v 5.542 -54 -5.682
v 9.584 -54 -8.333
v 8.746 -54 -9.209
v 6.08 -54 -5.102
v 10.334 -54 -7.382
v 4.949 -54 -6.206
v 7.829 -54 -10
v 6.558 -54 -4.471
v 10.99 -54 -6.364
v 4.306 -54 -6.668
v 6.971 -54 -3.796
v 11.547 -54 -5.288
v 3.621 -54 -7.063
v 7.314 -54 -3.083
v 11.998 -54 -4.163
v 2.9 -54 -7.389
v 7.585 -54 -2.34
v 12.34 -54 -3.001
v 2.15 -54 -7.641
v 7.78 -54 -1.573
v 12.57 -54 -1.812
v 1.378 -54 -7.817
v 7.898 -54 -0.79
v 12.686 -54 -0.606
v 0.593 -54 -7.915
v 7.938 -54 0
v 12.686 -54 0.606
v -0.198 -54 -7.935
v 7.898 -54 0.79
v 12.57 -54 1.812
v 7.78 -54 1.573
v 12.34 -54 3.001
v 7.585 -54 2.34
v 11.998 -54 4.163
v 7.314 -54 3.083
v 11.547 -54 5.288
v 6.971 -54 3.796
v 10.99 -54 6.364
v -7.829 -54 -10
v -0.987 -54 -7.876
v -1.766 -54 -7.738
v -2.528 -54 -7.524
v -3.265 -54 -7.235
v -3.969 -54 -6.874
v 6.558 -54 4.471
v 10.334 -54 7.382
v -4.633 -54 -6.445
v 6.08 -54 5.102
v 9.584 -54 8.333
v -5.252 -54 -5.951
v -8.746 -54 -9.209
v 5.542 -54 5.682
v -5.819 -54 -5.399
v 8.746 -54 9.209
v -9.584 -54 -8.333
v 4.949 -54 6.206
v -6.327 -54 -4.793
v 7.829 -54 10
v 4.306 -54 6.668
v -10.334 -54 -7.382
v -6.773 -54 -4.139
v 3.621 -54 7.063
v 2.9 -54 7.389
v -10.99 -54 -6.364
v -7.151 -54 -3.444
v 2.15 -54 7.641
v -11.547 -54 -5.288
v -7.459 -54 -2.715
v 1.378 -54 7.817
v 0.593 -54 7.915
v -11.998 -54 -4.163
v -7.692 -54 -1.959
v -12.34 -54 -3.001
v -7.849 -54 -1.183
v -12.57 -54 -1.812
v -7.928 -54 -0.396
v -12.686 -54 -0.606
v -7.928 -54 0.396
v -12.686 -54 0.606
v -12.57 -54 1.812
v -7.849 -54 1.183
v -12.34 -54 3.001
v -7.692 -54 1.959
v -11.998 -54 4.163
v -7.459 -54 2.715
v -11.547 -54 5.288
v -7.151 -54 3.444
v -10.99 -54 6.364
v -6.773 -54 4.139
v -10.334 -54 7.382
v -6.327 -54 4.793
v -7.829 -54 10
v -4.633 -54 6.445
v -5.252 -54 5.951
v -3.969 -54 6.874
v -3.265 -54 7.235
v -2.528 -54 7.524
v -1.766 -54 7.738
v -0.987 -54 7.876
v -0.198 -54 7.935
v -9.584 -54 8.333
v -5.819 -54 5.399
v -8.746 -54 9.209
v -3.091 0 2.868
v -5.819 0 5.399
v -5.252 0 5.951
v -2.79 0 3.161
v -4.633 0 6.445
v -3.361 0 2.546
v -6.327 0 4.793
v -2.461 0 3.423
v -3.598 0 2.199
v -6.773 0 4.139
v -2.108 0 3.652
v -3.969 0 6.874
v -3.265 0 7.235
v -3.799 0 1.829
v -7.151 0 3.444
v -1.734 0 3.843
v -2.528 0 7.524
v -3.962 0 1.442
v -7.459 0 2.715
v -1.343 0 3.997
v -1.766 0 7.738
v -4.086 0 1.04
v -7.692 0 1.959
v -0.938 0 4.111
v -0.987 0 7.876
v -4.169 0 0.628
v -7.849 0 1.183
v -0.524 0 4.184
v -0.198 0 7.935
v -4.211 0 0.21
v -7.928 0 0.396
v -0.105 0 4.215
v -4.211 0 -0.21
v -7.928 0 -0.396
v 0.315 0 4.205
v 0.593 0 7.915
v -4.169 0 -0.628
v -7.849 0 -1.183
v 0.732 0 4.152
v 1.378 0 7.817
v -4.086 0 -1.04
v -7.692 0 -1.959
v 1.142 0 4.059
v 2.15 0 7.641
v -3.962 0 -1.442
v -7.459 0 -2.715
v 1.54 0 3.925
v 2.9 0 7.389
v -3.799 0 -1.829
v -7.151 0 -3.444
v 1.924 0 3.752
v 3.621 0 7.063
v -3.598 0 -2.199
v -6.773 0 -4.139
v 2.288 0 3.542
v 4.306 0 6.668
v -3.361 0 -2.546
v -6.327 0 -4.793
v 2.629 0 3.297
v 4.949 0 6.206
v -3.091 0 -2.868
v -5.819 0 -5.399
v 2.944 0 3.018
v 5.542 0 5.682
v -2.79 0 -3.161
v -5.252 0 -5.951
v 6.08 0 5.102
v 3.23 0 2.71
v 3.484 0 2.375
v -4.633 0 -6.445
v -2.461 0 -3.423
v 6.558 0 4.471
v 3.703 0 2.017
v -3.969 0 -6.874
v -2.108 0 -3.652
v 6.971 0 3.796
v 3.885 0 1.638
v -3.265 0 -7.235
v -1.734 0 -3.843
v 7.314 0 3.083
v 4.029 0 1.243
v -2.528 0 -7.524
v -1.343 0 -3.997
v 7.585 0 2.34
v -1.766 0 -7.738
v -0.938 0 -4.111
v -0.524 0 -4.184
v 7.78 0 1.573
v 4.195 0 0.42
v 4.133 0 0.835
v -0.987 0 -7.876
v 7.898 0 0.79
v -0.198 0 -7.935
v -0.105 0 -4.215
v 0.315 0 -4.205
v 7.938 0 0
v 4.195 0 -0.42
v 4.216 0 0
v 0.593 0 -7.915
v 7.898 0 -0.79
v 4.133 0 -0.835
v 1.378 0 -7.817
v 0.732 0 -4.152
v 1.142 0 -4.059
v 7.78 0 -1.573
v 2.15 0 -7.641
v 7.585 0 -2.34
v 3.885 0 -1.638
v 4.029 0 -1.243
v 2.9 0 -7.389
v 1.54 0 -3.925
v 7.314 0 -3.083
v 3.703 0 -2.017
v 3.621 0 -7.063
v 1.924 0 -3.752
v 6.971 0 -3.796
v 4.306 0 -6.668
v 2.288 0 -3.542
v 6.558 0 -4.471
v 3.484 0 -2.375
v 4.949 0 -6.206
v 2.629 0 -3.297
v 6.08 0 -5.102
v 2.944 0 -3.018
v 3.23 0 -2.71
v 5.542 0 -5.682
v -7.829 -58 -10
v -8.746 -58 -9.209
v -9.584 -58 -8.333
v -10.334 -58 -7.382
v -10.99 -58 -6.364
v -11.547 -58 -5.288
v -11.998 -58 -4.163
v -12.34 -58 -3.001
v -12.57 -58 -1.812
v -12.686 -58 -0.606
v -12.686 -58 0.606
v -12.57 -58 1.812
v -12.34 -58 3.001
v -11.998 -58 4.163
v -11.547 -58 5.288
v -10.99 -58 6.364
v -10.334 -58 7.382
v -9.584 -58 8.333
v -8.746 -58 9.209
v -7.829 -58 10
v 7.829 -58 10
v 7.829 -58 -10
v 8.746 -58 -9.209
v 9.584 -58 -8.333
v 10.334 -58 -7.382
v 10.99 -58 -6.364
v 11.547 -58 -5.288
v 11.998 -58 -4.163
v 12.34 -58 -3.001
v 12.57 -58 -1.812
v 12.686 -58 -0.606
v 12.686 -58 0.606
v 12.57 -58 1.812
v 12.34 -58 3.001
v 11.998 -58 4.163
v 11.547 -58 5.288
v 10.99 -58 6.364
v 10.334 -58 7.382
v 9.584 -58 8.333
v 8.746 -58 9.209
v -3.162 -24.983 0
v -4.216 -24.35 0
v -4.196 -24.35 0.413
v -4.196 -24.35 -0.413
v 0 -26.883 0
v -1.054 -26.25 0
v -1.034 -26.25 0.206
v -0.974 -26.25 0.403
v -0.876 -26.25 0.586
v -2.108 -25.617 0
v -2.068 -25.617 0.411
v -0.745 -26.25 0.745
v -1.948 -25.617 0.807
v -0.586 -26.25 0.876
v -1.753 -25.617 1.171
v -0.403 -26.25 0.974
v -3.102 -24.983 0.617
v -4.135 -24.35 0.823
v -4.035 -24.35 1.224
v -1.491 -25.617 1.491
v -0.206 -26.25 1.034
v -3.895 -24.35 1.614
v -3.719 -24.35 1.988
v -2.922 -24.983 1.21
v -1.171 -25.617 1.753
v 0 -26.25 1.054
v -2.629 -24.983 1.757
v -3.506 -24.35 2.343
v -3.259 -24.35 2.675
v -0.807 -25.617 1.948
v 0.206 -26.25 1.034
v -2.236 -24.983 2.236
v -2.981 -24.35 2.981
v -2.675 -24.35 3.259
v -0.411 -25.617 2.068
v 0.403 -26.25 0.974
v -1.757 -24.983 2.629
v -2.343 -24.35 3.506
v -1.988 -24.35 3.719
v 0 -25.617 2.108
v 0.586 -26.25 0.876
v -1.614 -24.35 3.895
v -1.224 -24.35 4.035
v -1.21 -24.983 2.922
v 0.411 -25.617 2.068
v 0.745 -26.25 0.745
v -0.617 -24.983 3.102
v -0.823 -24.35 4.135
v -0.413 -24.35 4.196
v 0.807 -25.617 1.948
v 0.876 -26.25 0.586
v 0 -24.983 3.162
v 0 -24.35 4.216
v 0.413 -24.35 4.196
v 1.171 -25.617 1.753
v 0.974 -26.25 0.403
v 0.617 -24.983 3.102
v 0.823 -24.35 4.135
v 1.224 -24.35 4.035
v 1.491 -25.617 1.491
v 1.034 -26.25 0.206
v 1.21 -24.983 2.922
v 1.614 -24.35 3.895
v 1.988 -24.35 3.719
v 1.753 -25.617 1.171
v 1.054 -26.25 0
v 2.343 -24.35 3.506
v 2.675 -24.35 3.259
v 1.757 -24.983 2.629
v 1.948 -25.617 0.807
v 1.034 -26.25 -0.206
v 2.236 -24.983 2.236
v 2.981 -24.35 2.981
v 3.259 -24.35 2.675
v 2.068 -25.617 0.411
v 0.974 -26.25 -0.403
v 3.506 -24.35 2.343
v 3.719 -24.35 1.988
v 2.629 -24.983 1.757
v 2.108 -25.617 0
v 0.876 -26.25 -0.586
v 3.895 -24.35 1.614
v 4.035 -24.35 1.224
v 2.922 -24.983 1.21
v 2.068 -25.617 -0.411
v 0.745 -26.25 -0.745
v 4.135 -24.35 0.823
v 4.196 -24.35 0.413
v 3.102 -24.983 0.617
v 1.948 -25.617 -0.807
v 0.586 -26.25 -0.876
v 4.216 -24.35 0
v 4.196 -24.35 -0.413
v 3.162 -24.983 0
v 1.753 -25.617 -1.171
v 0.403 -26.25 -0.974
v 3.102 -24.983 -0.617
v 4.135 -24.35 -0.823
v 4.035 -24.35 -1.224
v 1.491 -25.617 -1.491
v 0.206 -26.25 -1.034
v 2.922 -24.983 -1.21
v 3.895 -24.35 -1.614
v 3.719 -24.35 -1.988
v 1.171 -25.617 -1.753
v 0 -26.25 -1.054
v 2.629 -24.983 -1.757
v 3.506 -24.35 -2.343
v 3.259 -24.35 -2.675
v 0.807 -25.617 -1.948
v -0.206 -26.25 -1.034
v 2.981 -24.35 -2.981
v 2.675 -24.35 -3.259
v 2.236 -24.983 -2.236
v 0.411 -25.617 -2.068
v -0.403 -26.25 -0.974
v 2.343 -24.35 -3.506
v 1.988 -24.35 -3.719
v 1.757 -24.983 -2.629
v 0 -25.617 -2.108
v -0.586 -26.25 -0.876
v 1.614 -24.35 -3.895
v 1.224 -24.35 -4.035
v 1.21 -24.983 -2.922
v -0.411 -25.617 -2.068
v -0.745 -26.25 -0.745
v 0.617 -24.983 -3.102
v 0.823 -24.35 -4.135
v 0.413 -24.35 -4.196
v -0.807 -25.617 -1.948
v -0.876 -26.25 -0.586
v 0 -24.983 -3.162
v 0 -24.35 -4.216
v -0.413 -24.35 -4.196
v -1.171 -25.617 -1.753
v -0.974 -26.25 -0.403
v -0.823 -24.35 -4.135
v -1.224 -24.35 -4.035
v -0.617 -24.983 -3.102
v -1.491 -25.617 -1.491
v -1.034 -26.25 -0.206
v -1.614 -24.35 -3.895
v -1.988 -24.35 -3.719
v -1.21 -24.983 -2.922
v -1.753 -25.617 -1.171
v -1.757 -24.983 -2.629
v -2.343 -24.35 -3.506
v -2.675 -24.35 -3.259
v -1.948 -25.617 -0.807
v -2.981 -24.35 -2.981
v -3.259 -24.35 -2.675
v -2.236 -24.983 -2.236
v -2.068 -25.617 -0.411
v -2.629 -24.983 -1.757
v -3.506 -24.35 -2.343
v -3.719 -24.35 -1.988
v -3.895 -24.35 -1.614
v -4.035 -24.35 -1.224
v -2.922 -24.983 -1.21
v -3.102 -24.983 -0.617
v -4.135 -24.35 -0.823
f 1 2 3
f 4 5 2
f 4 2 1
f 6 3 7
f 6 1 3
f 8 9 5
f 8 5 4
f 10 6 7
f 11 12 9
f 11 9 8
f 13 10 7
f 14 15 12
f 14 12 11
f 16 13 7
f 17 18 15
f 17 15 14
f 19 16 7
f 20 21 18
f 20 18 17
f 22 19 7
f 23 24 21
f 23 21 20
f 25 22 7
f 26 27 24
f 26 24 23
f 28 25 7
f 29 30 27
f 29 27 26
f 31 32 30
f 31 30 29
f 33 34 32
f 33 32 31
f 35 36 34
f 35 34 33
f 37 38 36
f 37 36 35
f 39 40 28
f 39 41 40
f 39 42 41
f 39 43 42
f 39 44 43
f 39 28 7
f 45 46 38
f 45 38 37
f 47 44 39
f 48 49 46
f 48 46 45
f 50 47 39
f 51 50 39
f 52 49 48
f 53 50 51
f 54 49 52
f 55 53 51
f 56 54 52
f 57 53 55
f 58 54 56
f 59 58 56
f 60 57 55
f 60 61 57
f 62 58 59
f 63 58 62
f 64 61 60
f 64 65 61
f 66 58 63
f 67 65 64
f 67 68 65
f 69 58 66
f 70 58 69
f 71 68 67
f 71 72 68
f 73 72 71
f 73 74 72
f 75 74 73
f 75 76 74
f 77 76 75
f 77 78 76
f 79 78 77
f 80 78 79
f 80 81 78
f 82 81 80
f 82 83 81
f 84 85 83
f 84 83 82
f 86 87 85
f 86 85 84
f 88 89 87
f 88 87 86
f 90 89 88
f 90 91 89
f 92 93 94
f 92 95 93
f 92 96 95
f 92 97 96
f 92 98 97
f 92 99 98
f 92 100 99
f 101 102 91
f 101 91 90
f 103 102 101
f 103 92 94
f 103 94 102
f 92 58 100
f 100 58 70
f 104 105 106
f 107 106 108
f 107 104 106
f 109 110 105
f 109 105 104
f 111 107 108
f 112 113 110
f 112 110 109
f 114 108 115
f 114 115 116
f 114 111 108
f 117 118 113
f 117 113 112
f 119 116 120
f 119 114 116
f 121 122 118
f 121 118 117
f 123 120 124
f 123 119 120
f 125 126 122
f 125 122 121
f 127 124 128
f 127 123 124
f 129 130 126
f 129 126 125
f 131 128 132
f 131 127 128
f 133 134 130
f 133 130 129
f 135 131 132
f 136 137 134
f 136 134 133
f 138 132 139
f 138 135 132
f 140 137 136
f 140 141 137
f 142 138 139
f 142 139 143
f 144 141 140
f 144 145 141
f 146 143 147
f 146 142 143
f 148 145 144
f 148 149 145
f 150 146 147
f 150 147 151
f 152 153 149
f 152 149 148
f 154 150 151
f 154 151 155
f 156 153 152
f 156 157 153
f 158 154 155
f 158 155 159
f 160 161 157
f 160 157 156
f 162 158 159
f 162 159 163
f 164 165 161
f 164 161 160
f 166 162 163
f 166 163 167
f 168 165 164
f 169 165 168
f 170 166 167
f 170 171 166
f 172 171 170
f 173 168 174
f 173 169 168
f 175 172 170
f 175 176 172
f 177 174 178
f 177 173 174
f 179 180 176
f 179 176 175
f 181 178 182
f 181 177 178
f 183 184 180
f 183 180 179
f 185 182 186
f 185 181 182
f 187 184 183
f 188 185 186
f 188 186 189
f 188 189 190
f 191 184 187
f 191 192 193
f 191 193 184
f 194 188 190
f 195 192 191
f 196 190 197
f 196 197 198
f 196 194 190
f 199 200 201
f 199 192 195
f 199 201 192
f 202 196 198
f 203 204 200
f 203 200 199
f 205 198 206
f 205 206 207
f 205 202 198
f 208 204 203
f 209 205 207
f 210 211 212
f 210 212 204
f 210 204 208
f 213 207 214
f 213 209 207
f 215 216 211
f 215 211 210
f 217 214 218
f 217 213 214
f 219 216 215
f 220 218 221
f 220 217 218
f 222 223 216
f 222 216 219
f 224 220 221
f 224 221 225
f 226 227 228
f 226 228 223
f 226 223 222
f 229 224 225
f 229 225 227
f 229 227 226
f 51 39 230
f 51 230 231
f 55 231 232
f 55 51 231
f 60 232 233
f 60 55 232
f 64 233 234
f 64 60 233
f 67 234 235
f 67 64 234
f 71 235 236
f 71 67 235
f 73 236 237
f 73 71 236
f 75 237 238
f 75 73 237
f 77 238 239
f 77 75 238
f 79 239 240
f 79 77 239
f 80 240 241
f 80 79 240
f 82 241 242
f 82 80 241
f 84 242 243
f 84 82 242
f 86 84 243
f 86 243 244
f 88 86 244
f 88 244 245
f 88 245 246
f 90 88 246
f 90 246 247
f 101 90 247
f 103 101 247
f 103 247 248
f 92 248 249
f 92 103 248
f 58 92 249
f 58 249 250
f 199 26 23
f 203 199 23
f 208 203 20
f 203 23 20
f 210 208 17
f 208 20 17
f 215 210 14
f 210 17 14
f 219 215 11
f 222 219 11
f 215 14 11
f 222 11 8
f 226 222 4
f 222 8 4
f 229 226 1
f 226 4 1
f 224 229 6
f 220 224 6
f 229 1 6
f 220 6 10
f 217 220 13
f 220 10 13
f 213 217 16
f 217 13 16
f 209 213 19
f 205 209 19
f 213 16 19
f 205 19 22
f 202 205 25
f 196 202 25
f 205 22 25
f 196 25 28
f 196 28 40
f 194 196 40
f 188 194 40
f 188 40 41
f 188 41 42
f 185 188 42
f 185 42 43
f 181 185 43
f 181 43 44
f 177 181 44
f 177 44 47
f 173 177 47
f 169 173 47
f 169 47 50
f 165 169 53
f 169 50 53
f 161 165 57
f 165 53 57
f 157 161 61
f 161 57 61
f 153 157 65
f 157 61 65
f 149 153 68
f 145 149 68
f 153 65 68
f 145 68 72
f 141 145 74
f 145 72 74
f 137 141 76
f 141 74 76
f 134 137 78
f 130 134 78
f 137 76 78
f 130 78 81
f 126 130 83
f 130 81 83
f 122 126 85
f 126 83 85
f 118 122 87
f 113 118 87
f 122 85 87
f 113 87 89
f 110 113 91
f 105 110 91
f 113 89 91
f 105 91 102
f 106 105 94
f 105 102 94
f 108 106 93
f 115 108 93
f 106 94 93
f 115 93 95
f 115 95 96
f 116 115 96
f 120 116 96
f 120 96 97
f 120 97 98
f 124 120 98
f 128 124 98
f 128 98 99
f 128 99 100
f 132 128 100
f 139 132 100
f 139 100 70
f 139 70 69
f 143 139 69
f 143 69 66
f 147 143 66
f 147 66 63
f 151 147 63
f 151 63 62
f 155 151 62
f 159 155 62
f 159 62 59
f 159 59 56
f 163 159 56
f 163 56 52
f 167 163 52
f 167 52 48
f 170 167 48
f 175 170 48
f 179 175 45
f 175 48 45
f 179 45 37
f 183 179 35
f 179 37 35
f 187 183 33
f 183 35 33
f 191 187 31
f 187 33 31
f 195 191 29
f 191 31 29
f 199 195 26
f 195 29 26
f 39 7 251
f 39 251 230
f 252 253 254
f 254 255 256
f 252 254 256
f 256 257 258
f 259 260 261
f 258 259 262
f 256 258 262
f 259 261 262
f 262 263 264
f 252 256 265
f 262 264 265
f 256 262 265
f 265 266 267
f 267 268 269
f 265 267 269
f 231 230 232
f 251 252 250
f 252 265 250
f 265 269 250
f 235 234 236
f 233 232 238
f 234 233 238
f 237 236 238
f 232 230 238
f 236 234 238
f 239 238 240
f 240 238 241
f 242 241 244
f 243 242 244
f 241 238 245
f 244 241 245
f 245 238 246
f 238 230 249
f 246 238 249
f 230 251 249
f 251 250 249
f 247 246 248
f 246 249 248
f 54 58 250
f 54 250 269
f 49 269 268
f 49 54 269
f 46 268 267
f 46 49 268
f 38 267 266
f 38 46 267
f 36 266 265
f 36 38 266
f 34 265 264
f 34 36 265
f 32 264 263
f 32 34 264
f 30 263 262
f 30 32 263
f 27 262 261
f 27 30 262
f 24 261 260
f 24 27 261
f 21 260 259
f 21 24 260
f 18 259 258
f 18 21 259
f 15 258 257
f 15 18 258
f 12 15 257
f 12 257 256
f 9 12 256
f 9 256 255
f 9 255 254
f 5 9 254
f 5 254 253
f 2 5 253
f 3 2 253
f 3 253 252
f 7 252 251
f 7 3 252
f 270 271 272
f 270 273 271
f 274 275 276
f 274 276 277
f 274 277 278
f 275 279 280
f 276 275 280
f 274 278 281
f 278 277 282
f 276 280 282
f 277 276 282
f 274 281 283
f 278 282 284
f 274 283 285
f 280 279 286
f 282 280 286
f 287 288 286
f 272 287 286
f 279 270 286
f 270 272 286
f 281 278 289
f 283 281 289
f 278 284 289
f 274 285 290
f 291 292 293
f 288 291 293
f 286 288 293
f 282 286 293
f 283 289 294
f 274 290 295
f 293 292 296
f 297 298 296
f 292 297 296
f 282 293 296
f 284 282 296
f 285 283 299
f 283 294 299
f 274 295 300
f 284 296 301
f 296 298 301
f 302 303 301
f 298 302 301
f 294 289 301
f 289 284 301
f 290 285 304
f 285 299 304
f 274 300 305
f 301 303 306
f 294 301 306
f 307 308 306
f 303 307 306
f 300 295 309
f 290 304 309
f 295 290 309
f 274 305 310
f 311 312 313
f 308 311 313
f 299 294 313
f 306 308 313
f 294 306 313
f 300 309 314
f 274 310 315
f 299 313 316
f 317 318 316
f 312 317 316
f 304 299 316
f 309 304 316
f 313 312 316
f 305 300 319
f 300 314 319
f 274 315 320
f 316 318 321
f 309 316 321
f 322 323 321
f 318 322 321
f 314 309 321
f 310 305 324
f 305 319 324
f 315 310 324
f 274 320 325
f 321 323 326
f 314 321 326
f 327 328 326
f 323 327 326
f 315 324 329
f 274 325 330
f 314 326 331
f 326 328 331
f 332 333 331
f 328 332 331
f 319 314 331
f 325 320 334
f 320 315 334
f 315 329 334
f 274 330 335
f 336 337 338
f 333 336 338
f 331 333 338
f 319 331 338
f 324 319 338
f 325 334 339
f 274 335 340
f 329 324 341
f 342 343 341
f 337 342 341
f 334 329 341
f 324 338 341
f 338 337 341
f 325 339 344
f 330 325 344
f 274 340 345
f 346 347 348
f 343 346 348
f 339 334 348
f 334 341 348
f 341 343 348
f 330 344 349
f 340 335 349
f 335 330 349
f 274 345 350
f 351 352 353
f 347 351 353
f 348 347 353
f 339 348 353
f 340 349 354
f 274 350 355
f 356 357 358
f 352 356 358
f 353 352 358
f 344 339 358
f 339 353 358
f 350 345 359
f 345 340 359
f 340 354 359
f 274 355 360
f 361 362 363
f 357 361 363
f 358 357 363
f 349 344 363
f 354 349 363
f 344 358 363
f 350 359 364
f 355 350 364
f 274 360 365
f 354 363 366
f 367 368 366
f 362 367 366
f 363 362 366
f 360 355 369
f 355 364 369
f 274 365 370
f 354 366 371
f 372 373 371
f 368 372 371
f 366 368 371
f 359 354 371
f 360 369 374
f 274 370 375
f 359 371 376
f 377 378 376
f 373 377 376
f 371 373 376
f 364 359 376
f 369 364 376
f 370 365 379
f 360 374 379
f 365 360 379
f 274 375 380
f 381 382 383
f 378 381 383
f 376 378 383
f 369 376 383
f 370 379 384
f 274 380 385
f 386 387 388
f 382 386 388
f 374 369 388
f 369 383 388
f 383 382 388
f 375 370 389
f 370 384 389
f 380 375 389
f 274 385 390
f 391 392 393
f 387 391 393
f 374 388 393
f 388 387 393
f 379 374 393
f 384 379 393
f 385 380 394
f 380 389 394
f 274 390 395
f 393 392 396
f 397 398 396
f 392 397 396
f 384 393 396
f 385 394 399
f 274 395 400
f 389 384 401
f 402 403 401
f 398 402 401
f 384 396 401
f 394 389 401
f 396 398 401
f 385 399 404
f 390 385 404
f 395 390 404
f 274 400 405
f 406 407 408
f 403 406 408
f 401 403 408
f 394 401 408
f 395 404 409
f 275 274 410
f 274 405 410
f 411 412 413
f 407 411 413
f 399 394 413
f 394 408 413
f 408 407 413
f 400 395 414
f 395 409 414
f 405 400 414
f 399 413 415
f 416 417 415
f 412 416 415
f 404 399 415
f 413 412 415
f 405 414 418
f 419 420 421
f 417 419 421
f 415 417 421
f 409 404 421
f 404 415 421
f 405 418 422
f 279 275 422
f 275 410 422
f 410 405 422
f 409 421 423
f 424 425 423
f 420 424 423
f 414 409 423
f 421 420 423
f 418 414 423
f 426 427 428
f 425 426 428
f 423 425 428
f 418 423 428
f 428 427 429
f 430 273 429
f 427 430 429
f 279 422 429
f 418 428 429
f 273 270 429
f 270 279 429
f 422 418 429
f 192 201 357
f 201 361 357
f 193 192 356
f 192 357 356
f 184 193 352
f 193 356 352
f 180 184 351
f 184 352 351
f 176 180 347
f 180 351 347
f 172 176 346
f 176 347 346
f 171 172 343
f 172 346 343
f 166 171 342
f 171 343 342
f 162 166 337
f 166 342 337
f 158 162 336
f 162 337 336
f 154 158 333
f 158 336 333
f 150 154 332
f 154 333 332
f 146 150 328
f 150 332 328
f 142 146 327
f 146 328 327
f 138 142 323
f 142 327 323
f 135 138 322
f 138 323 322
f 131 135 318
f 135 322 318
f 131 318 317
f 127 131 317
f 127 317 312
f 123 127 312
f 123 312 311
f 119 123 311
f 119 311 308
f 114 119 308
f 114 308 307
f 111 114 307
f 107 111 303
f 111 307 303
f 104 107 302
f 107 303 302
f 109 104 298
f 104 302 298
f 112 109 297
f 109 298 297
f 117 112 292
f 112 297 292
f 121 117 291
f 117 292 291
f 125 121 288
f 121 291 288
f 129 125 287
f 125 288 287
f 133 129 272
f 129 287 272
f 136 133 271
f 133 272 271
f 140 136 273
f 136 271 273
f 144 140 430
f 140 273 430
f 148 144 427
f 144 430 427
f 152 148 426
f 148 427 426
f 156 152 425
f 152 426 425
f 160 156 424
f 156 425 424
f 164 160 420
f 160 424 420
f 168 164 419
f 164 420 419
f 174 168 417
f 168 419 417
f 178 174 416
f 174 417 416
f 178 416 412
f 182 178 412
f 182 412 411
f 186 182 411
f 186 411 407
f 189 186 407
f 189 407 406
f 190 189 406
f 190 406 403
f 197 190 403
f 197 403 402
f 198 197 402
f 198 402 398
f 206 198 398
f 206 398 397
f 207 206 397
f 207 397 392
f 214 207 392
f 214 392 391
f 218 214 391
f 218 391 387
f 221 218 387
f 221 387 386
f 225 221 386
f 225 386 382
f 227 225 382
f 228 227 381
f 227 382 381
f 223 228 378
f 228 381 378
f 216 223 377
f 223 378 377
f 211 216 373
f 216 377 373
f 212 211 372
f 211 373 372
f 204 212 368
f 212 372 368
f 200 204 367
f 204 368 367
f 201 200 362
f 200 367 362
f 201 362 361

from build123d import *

# Parameters (mm, degrees)
EXTRUDE1_START              = -54
SKETCH1_R                   = 7.9375
EXTRUDE1_DEPTH              = 54
EXTRUDE4_DEPTH              = 4
F_3_8_24_TAPPED_HOLE1_D     = 8.4328
F_3_8_24_TAPPED_HOLE1_DEPTH = 24.35
F_3_8_24_TAPPED_HOLE1_TIP   = 2.533468714


with BuildPart() as part:
    # Sketch1 → Extrude1 (new body)
    with BuildSketch(Plane(origin=(0, 0, 0), x_dir=(1, 0, 0), z_dir=(0, 1, 0)).offset(EXTRUDE1_START)):
        Circle(SKETCH1_R)
    extrude(amount=EXTRUDE1_DEPTH)

    # Sketch4 → Extrude4 (add)
    with BuildSketch(Plane.XZ.offset(54)):
        with BuildLine():
            Line((-7.82879301, 10), (7.82879301, 10))
            ThreePointArc((7.82879301, 10), (12.7, 0), (7.82879301, -10))
            Line((7.82879301, -10), (-7.82879301, -10))
            ThreePointArc((-7.82879301, -10), (-12.7, 0), (-7.82879301, 10))
        make_face()
    extrude(amount=EXTRUDE4_DEPTH)

    # 3_8-24 Tapped Hole1
    with Locations(Plane(origin=(0, 0, 0), x_dir=(-1, 0, 0), z_dir=(0, 1, 0))):
        with Locations((0, 0)):
            Hole(F_3_8_24_TAPPED_HOLE1_D / 2, depth=F_3_8_24_TAPPED_HOLE1_DEPTH)
            with Locations((0, 0, -(F_3_8_24_TAPPED_HOLE1_DEPTH + F_3_8_24_TAPPED_HOLE1_TIP / 2))):  # 118° drill point
                Cone(0, F_3_8_24_TAPPED_HOLE1_D / 2, F_3_8_24_TAPPED_HOLE1_TIP, mode=Mode.SUBTRACT)


solid = part.part
